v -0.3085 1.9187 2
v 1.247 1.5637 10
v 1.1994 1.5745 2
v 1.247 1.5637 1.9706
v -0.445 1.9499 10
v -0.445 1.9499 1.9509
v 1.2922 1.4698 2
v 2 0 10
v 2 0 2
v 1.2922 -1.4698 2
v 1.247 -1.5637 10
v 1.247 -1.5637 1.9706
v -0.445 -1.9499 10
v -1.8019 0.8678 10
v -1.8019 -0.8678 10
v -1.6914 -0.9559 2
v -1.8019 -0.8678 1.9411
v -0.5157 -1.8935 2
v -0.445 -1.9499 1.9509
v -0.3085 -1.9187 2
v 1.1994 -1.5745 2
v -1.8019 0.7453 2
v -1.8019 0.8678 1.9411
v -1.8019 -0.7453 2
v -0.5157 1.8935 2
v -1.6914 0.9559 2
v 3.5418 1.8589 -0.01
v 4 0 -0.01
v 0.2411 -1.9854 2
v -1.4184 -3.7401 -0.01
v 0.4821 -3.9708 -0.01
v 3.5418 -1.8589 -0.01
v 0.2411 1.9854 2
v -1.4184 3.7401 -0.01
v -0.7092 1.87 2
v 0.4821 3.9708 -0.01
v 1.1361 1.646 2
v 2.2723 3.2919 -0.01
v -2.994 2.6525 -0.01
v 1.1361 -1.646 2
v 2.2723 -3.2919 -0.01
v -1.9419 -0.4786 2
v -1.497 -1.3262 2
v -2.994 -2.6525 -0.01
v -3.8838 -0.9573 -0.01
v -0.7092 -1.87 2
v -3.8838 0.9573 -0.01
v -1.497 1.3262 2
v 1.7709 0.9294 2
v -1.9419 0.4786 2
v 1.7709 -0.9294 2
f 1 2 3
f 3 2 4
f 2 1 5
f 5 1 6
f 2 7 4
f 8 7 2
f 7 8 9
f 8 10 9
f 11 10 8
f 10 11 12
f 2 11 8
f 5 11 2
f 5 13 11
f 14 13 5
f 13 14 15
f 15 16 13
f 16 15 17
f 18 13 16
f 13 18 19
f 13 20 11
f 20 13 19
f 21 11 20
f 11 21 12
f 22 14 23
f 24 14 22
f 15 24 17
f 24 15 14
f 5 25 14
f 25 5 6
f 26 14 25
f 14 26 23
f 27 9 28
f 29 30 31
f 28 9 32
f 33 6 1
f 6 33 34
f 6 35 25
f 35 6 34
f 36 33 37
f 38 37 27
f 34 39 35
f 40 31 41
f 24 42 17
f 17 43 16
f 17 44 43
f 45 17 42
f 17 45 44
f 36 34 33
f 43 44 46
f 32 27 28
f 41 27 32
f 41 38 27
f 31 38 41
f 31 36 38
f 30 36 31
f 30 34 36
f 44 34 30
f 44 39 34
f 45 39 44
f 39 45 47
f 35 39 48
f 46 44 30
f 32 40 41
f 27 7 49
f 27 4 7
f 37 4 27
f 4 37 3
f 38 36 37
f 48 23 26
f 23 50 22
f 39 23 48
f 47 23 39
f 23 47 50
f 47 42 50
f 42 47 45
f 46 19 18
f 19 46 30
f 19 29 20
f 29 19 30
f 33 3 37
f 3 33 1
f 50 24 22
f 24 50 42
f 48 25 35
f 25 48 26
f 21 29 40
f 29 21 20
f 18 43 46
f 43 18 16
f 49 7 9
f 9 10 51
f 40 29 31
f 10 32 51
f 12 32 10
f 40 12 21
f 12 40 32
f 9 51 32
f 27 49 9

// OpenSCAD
// use it with difference() function to 'bore' a whole into an object / plate
module bore_sunk_head_screw(diameter = 4, depth = 10, sink_diameter = 8, sink_depth = 2, outer_sink_depth = 0) {
    
    // protrude from surface to work around OpenSCAD quick render issue
    workaround_quick_render_issue_depth_offset = 0.01;    
    outer_sink_depth = outer_sink_depth - workaround_quick_render_issue_depth_offset;
    sink_depth = sink_depth + workaround_quick_render_issue_depth_offset;
    
    union() {
        cylinder(d = diameter, h = depth);
        translate([0, 0, outer_sink_depth]) cylinder(d1 = sink_diameter, d2 = diameter, h = sink_depth);
    }
}

bore_sunk_head_screw();
